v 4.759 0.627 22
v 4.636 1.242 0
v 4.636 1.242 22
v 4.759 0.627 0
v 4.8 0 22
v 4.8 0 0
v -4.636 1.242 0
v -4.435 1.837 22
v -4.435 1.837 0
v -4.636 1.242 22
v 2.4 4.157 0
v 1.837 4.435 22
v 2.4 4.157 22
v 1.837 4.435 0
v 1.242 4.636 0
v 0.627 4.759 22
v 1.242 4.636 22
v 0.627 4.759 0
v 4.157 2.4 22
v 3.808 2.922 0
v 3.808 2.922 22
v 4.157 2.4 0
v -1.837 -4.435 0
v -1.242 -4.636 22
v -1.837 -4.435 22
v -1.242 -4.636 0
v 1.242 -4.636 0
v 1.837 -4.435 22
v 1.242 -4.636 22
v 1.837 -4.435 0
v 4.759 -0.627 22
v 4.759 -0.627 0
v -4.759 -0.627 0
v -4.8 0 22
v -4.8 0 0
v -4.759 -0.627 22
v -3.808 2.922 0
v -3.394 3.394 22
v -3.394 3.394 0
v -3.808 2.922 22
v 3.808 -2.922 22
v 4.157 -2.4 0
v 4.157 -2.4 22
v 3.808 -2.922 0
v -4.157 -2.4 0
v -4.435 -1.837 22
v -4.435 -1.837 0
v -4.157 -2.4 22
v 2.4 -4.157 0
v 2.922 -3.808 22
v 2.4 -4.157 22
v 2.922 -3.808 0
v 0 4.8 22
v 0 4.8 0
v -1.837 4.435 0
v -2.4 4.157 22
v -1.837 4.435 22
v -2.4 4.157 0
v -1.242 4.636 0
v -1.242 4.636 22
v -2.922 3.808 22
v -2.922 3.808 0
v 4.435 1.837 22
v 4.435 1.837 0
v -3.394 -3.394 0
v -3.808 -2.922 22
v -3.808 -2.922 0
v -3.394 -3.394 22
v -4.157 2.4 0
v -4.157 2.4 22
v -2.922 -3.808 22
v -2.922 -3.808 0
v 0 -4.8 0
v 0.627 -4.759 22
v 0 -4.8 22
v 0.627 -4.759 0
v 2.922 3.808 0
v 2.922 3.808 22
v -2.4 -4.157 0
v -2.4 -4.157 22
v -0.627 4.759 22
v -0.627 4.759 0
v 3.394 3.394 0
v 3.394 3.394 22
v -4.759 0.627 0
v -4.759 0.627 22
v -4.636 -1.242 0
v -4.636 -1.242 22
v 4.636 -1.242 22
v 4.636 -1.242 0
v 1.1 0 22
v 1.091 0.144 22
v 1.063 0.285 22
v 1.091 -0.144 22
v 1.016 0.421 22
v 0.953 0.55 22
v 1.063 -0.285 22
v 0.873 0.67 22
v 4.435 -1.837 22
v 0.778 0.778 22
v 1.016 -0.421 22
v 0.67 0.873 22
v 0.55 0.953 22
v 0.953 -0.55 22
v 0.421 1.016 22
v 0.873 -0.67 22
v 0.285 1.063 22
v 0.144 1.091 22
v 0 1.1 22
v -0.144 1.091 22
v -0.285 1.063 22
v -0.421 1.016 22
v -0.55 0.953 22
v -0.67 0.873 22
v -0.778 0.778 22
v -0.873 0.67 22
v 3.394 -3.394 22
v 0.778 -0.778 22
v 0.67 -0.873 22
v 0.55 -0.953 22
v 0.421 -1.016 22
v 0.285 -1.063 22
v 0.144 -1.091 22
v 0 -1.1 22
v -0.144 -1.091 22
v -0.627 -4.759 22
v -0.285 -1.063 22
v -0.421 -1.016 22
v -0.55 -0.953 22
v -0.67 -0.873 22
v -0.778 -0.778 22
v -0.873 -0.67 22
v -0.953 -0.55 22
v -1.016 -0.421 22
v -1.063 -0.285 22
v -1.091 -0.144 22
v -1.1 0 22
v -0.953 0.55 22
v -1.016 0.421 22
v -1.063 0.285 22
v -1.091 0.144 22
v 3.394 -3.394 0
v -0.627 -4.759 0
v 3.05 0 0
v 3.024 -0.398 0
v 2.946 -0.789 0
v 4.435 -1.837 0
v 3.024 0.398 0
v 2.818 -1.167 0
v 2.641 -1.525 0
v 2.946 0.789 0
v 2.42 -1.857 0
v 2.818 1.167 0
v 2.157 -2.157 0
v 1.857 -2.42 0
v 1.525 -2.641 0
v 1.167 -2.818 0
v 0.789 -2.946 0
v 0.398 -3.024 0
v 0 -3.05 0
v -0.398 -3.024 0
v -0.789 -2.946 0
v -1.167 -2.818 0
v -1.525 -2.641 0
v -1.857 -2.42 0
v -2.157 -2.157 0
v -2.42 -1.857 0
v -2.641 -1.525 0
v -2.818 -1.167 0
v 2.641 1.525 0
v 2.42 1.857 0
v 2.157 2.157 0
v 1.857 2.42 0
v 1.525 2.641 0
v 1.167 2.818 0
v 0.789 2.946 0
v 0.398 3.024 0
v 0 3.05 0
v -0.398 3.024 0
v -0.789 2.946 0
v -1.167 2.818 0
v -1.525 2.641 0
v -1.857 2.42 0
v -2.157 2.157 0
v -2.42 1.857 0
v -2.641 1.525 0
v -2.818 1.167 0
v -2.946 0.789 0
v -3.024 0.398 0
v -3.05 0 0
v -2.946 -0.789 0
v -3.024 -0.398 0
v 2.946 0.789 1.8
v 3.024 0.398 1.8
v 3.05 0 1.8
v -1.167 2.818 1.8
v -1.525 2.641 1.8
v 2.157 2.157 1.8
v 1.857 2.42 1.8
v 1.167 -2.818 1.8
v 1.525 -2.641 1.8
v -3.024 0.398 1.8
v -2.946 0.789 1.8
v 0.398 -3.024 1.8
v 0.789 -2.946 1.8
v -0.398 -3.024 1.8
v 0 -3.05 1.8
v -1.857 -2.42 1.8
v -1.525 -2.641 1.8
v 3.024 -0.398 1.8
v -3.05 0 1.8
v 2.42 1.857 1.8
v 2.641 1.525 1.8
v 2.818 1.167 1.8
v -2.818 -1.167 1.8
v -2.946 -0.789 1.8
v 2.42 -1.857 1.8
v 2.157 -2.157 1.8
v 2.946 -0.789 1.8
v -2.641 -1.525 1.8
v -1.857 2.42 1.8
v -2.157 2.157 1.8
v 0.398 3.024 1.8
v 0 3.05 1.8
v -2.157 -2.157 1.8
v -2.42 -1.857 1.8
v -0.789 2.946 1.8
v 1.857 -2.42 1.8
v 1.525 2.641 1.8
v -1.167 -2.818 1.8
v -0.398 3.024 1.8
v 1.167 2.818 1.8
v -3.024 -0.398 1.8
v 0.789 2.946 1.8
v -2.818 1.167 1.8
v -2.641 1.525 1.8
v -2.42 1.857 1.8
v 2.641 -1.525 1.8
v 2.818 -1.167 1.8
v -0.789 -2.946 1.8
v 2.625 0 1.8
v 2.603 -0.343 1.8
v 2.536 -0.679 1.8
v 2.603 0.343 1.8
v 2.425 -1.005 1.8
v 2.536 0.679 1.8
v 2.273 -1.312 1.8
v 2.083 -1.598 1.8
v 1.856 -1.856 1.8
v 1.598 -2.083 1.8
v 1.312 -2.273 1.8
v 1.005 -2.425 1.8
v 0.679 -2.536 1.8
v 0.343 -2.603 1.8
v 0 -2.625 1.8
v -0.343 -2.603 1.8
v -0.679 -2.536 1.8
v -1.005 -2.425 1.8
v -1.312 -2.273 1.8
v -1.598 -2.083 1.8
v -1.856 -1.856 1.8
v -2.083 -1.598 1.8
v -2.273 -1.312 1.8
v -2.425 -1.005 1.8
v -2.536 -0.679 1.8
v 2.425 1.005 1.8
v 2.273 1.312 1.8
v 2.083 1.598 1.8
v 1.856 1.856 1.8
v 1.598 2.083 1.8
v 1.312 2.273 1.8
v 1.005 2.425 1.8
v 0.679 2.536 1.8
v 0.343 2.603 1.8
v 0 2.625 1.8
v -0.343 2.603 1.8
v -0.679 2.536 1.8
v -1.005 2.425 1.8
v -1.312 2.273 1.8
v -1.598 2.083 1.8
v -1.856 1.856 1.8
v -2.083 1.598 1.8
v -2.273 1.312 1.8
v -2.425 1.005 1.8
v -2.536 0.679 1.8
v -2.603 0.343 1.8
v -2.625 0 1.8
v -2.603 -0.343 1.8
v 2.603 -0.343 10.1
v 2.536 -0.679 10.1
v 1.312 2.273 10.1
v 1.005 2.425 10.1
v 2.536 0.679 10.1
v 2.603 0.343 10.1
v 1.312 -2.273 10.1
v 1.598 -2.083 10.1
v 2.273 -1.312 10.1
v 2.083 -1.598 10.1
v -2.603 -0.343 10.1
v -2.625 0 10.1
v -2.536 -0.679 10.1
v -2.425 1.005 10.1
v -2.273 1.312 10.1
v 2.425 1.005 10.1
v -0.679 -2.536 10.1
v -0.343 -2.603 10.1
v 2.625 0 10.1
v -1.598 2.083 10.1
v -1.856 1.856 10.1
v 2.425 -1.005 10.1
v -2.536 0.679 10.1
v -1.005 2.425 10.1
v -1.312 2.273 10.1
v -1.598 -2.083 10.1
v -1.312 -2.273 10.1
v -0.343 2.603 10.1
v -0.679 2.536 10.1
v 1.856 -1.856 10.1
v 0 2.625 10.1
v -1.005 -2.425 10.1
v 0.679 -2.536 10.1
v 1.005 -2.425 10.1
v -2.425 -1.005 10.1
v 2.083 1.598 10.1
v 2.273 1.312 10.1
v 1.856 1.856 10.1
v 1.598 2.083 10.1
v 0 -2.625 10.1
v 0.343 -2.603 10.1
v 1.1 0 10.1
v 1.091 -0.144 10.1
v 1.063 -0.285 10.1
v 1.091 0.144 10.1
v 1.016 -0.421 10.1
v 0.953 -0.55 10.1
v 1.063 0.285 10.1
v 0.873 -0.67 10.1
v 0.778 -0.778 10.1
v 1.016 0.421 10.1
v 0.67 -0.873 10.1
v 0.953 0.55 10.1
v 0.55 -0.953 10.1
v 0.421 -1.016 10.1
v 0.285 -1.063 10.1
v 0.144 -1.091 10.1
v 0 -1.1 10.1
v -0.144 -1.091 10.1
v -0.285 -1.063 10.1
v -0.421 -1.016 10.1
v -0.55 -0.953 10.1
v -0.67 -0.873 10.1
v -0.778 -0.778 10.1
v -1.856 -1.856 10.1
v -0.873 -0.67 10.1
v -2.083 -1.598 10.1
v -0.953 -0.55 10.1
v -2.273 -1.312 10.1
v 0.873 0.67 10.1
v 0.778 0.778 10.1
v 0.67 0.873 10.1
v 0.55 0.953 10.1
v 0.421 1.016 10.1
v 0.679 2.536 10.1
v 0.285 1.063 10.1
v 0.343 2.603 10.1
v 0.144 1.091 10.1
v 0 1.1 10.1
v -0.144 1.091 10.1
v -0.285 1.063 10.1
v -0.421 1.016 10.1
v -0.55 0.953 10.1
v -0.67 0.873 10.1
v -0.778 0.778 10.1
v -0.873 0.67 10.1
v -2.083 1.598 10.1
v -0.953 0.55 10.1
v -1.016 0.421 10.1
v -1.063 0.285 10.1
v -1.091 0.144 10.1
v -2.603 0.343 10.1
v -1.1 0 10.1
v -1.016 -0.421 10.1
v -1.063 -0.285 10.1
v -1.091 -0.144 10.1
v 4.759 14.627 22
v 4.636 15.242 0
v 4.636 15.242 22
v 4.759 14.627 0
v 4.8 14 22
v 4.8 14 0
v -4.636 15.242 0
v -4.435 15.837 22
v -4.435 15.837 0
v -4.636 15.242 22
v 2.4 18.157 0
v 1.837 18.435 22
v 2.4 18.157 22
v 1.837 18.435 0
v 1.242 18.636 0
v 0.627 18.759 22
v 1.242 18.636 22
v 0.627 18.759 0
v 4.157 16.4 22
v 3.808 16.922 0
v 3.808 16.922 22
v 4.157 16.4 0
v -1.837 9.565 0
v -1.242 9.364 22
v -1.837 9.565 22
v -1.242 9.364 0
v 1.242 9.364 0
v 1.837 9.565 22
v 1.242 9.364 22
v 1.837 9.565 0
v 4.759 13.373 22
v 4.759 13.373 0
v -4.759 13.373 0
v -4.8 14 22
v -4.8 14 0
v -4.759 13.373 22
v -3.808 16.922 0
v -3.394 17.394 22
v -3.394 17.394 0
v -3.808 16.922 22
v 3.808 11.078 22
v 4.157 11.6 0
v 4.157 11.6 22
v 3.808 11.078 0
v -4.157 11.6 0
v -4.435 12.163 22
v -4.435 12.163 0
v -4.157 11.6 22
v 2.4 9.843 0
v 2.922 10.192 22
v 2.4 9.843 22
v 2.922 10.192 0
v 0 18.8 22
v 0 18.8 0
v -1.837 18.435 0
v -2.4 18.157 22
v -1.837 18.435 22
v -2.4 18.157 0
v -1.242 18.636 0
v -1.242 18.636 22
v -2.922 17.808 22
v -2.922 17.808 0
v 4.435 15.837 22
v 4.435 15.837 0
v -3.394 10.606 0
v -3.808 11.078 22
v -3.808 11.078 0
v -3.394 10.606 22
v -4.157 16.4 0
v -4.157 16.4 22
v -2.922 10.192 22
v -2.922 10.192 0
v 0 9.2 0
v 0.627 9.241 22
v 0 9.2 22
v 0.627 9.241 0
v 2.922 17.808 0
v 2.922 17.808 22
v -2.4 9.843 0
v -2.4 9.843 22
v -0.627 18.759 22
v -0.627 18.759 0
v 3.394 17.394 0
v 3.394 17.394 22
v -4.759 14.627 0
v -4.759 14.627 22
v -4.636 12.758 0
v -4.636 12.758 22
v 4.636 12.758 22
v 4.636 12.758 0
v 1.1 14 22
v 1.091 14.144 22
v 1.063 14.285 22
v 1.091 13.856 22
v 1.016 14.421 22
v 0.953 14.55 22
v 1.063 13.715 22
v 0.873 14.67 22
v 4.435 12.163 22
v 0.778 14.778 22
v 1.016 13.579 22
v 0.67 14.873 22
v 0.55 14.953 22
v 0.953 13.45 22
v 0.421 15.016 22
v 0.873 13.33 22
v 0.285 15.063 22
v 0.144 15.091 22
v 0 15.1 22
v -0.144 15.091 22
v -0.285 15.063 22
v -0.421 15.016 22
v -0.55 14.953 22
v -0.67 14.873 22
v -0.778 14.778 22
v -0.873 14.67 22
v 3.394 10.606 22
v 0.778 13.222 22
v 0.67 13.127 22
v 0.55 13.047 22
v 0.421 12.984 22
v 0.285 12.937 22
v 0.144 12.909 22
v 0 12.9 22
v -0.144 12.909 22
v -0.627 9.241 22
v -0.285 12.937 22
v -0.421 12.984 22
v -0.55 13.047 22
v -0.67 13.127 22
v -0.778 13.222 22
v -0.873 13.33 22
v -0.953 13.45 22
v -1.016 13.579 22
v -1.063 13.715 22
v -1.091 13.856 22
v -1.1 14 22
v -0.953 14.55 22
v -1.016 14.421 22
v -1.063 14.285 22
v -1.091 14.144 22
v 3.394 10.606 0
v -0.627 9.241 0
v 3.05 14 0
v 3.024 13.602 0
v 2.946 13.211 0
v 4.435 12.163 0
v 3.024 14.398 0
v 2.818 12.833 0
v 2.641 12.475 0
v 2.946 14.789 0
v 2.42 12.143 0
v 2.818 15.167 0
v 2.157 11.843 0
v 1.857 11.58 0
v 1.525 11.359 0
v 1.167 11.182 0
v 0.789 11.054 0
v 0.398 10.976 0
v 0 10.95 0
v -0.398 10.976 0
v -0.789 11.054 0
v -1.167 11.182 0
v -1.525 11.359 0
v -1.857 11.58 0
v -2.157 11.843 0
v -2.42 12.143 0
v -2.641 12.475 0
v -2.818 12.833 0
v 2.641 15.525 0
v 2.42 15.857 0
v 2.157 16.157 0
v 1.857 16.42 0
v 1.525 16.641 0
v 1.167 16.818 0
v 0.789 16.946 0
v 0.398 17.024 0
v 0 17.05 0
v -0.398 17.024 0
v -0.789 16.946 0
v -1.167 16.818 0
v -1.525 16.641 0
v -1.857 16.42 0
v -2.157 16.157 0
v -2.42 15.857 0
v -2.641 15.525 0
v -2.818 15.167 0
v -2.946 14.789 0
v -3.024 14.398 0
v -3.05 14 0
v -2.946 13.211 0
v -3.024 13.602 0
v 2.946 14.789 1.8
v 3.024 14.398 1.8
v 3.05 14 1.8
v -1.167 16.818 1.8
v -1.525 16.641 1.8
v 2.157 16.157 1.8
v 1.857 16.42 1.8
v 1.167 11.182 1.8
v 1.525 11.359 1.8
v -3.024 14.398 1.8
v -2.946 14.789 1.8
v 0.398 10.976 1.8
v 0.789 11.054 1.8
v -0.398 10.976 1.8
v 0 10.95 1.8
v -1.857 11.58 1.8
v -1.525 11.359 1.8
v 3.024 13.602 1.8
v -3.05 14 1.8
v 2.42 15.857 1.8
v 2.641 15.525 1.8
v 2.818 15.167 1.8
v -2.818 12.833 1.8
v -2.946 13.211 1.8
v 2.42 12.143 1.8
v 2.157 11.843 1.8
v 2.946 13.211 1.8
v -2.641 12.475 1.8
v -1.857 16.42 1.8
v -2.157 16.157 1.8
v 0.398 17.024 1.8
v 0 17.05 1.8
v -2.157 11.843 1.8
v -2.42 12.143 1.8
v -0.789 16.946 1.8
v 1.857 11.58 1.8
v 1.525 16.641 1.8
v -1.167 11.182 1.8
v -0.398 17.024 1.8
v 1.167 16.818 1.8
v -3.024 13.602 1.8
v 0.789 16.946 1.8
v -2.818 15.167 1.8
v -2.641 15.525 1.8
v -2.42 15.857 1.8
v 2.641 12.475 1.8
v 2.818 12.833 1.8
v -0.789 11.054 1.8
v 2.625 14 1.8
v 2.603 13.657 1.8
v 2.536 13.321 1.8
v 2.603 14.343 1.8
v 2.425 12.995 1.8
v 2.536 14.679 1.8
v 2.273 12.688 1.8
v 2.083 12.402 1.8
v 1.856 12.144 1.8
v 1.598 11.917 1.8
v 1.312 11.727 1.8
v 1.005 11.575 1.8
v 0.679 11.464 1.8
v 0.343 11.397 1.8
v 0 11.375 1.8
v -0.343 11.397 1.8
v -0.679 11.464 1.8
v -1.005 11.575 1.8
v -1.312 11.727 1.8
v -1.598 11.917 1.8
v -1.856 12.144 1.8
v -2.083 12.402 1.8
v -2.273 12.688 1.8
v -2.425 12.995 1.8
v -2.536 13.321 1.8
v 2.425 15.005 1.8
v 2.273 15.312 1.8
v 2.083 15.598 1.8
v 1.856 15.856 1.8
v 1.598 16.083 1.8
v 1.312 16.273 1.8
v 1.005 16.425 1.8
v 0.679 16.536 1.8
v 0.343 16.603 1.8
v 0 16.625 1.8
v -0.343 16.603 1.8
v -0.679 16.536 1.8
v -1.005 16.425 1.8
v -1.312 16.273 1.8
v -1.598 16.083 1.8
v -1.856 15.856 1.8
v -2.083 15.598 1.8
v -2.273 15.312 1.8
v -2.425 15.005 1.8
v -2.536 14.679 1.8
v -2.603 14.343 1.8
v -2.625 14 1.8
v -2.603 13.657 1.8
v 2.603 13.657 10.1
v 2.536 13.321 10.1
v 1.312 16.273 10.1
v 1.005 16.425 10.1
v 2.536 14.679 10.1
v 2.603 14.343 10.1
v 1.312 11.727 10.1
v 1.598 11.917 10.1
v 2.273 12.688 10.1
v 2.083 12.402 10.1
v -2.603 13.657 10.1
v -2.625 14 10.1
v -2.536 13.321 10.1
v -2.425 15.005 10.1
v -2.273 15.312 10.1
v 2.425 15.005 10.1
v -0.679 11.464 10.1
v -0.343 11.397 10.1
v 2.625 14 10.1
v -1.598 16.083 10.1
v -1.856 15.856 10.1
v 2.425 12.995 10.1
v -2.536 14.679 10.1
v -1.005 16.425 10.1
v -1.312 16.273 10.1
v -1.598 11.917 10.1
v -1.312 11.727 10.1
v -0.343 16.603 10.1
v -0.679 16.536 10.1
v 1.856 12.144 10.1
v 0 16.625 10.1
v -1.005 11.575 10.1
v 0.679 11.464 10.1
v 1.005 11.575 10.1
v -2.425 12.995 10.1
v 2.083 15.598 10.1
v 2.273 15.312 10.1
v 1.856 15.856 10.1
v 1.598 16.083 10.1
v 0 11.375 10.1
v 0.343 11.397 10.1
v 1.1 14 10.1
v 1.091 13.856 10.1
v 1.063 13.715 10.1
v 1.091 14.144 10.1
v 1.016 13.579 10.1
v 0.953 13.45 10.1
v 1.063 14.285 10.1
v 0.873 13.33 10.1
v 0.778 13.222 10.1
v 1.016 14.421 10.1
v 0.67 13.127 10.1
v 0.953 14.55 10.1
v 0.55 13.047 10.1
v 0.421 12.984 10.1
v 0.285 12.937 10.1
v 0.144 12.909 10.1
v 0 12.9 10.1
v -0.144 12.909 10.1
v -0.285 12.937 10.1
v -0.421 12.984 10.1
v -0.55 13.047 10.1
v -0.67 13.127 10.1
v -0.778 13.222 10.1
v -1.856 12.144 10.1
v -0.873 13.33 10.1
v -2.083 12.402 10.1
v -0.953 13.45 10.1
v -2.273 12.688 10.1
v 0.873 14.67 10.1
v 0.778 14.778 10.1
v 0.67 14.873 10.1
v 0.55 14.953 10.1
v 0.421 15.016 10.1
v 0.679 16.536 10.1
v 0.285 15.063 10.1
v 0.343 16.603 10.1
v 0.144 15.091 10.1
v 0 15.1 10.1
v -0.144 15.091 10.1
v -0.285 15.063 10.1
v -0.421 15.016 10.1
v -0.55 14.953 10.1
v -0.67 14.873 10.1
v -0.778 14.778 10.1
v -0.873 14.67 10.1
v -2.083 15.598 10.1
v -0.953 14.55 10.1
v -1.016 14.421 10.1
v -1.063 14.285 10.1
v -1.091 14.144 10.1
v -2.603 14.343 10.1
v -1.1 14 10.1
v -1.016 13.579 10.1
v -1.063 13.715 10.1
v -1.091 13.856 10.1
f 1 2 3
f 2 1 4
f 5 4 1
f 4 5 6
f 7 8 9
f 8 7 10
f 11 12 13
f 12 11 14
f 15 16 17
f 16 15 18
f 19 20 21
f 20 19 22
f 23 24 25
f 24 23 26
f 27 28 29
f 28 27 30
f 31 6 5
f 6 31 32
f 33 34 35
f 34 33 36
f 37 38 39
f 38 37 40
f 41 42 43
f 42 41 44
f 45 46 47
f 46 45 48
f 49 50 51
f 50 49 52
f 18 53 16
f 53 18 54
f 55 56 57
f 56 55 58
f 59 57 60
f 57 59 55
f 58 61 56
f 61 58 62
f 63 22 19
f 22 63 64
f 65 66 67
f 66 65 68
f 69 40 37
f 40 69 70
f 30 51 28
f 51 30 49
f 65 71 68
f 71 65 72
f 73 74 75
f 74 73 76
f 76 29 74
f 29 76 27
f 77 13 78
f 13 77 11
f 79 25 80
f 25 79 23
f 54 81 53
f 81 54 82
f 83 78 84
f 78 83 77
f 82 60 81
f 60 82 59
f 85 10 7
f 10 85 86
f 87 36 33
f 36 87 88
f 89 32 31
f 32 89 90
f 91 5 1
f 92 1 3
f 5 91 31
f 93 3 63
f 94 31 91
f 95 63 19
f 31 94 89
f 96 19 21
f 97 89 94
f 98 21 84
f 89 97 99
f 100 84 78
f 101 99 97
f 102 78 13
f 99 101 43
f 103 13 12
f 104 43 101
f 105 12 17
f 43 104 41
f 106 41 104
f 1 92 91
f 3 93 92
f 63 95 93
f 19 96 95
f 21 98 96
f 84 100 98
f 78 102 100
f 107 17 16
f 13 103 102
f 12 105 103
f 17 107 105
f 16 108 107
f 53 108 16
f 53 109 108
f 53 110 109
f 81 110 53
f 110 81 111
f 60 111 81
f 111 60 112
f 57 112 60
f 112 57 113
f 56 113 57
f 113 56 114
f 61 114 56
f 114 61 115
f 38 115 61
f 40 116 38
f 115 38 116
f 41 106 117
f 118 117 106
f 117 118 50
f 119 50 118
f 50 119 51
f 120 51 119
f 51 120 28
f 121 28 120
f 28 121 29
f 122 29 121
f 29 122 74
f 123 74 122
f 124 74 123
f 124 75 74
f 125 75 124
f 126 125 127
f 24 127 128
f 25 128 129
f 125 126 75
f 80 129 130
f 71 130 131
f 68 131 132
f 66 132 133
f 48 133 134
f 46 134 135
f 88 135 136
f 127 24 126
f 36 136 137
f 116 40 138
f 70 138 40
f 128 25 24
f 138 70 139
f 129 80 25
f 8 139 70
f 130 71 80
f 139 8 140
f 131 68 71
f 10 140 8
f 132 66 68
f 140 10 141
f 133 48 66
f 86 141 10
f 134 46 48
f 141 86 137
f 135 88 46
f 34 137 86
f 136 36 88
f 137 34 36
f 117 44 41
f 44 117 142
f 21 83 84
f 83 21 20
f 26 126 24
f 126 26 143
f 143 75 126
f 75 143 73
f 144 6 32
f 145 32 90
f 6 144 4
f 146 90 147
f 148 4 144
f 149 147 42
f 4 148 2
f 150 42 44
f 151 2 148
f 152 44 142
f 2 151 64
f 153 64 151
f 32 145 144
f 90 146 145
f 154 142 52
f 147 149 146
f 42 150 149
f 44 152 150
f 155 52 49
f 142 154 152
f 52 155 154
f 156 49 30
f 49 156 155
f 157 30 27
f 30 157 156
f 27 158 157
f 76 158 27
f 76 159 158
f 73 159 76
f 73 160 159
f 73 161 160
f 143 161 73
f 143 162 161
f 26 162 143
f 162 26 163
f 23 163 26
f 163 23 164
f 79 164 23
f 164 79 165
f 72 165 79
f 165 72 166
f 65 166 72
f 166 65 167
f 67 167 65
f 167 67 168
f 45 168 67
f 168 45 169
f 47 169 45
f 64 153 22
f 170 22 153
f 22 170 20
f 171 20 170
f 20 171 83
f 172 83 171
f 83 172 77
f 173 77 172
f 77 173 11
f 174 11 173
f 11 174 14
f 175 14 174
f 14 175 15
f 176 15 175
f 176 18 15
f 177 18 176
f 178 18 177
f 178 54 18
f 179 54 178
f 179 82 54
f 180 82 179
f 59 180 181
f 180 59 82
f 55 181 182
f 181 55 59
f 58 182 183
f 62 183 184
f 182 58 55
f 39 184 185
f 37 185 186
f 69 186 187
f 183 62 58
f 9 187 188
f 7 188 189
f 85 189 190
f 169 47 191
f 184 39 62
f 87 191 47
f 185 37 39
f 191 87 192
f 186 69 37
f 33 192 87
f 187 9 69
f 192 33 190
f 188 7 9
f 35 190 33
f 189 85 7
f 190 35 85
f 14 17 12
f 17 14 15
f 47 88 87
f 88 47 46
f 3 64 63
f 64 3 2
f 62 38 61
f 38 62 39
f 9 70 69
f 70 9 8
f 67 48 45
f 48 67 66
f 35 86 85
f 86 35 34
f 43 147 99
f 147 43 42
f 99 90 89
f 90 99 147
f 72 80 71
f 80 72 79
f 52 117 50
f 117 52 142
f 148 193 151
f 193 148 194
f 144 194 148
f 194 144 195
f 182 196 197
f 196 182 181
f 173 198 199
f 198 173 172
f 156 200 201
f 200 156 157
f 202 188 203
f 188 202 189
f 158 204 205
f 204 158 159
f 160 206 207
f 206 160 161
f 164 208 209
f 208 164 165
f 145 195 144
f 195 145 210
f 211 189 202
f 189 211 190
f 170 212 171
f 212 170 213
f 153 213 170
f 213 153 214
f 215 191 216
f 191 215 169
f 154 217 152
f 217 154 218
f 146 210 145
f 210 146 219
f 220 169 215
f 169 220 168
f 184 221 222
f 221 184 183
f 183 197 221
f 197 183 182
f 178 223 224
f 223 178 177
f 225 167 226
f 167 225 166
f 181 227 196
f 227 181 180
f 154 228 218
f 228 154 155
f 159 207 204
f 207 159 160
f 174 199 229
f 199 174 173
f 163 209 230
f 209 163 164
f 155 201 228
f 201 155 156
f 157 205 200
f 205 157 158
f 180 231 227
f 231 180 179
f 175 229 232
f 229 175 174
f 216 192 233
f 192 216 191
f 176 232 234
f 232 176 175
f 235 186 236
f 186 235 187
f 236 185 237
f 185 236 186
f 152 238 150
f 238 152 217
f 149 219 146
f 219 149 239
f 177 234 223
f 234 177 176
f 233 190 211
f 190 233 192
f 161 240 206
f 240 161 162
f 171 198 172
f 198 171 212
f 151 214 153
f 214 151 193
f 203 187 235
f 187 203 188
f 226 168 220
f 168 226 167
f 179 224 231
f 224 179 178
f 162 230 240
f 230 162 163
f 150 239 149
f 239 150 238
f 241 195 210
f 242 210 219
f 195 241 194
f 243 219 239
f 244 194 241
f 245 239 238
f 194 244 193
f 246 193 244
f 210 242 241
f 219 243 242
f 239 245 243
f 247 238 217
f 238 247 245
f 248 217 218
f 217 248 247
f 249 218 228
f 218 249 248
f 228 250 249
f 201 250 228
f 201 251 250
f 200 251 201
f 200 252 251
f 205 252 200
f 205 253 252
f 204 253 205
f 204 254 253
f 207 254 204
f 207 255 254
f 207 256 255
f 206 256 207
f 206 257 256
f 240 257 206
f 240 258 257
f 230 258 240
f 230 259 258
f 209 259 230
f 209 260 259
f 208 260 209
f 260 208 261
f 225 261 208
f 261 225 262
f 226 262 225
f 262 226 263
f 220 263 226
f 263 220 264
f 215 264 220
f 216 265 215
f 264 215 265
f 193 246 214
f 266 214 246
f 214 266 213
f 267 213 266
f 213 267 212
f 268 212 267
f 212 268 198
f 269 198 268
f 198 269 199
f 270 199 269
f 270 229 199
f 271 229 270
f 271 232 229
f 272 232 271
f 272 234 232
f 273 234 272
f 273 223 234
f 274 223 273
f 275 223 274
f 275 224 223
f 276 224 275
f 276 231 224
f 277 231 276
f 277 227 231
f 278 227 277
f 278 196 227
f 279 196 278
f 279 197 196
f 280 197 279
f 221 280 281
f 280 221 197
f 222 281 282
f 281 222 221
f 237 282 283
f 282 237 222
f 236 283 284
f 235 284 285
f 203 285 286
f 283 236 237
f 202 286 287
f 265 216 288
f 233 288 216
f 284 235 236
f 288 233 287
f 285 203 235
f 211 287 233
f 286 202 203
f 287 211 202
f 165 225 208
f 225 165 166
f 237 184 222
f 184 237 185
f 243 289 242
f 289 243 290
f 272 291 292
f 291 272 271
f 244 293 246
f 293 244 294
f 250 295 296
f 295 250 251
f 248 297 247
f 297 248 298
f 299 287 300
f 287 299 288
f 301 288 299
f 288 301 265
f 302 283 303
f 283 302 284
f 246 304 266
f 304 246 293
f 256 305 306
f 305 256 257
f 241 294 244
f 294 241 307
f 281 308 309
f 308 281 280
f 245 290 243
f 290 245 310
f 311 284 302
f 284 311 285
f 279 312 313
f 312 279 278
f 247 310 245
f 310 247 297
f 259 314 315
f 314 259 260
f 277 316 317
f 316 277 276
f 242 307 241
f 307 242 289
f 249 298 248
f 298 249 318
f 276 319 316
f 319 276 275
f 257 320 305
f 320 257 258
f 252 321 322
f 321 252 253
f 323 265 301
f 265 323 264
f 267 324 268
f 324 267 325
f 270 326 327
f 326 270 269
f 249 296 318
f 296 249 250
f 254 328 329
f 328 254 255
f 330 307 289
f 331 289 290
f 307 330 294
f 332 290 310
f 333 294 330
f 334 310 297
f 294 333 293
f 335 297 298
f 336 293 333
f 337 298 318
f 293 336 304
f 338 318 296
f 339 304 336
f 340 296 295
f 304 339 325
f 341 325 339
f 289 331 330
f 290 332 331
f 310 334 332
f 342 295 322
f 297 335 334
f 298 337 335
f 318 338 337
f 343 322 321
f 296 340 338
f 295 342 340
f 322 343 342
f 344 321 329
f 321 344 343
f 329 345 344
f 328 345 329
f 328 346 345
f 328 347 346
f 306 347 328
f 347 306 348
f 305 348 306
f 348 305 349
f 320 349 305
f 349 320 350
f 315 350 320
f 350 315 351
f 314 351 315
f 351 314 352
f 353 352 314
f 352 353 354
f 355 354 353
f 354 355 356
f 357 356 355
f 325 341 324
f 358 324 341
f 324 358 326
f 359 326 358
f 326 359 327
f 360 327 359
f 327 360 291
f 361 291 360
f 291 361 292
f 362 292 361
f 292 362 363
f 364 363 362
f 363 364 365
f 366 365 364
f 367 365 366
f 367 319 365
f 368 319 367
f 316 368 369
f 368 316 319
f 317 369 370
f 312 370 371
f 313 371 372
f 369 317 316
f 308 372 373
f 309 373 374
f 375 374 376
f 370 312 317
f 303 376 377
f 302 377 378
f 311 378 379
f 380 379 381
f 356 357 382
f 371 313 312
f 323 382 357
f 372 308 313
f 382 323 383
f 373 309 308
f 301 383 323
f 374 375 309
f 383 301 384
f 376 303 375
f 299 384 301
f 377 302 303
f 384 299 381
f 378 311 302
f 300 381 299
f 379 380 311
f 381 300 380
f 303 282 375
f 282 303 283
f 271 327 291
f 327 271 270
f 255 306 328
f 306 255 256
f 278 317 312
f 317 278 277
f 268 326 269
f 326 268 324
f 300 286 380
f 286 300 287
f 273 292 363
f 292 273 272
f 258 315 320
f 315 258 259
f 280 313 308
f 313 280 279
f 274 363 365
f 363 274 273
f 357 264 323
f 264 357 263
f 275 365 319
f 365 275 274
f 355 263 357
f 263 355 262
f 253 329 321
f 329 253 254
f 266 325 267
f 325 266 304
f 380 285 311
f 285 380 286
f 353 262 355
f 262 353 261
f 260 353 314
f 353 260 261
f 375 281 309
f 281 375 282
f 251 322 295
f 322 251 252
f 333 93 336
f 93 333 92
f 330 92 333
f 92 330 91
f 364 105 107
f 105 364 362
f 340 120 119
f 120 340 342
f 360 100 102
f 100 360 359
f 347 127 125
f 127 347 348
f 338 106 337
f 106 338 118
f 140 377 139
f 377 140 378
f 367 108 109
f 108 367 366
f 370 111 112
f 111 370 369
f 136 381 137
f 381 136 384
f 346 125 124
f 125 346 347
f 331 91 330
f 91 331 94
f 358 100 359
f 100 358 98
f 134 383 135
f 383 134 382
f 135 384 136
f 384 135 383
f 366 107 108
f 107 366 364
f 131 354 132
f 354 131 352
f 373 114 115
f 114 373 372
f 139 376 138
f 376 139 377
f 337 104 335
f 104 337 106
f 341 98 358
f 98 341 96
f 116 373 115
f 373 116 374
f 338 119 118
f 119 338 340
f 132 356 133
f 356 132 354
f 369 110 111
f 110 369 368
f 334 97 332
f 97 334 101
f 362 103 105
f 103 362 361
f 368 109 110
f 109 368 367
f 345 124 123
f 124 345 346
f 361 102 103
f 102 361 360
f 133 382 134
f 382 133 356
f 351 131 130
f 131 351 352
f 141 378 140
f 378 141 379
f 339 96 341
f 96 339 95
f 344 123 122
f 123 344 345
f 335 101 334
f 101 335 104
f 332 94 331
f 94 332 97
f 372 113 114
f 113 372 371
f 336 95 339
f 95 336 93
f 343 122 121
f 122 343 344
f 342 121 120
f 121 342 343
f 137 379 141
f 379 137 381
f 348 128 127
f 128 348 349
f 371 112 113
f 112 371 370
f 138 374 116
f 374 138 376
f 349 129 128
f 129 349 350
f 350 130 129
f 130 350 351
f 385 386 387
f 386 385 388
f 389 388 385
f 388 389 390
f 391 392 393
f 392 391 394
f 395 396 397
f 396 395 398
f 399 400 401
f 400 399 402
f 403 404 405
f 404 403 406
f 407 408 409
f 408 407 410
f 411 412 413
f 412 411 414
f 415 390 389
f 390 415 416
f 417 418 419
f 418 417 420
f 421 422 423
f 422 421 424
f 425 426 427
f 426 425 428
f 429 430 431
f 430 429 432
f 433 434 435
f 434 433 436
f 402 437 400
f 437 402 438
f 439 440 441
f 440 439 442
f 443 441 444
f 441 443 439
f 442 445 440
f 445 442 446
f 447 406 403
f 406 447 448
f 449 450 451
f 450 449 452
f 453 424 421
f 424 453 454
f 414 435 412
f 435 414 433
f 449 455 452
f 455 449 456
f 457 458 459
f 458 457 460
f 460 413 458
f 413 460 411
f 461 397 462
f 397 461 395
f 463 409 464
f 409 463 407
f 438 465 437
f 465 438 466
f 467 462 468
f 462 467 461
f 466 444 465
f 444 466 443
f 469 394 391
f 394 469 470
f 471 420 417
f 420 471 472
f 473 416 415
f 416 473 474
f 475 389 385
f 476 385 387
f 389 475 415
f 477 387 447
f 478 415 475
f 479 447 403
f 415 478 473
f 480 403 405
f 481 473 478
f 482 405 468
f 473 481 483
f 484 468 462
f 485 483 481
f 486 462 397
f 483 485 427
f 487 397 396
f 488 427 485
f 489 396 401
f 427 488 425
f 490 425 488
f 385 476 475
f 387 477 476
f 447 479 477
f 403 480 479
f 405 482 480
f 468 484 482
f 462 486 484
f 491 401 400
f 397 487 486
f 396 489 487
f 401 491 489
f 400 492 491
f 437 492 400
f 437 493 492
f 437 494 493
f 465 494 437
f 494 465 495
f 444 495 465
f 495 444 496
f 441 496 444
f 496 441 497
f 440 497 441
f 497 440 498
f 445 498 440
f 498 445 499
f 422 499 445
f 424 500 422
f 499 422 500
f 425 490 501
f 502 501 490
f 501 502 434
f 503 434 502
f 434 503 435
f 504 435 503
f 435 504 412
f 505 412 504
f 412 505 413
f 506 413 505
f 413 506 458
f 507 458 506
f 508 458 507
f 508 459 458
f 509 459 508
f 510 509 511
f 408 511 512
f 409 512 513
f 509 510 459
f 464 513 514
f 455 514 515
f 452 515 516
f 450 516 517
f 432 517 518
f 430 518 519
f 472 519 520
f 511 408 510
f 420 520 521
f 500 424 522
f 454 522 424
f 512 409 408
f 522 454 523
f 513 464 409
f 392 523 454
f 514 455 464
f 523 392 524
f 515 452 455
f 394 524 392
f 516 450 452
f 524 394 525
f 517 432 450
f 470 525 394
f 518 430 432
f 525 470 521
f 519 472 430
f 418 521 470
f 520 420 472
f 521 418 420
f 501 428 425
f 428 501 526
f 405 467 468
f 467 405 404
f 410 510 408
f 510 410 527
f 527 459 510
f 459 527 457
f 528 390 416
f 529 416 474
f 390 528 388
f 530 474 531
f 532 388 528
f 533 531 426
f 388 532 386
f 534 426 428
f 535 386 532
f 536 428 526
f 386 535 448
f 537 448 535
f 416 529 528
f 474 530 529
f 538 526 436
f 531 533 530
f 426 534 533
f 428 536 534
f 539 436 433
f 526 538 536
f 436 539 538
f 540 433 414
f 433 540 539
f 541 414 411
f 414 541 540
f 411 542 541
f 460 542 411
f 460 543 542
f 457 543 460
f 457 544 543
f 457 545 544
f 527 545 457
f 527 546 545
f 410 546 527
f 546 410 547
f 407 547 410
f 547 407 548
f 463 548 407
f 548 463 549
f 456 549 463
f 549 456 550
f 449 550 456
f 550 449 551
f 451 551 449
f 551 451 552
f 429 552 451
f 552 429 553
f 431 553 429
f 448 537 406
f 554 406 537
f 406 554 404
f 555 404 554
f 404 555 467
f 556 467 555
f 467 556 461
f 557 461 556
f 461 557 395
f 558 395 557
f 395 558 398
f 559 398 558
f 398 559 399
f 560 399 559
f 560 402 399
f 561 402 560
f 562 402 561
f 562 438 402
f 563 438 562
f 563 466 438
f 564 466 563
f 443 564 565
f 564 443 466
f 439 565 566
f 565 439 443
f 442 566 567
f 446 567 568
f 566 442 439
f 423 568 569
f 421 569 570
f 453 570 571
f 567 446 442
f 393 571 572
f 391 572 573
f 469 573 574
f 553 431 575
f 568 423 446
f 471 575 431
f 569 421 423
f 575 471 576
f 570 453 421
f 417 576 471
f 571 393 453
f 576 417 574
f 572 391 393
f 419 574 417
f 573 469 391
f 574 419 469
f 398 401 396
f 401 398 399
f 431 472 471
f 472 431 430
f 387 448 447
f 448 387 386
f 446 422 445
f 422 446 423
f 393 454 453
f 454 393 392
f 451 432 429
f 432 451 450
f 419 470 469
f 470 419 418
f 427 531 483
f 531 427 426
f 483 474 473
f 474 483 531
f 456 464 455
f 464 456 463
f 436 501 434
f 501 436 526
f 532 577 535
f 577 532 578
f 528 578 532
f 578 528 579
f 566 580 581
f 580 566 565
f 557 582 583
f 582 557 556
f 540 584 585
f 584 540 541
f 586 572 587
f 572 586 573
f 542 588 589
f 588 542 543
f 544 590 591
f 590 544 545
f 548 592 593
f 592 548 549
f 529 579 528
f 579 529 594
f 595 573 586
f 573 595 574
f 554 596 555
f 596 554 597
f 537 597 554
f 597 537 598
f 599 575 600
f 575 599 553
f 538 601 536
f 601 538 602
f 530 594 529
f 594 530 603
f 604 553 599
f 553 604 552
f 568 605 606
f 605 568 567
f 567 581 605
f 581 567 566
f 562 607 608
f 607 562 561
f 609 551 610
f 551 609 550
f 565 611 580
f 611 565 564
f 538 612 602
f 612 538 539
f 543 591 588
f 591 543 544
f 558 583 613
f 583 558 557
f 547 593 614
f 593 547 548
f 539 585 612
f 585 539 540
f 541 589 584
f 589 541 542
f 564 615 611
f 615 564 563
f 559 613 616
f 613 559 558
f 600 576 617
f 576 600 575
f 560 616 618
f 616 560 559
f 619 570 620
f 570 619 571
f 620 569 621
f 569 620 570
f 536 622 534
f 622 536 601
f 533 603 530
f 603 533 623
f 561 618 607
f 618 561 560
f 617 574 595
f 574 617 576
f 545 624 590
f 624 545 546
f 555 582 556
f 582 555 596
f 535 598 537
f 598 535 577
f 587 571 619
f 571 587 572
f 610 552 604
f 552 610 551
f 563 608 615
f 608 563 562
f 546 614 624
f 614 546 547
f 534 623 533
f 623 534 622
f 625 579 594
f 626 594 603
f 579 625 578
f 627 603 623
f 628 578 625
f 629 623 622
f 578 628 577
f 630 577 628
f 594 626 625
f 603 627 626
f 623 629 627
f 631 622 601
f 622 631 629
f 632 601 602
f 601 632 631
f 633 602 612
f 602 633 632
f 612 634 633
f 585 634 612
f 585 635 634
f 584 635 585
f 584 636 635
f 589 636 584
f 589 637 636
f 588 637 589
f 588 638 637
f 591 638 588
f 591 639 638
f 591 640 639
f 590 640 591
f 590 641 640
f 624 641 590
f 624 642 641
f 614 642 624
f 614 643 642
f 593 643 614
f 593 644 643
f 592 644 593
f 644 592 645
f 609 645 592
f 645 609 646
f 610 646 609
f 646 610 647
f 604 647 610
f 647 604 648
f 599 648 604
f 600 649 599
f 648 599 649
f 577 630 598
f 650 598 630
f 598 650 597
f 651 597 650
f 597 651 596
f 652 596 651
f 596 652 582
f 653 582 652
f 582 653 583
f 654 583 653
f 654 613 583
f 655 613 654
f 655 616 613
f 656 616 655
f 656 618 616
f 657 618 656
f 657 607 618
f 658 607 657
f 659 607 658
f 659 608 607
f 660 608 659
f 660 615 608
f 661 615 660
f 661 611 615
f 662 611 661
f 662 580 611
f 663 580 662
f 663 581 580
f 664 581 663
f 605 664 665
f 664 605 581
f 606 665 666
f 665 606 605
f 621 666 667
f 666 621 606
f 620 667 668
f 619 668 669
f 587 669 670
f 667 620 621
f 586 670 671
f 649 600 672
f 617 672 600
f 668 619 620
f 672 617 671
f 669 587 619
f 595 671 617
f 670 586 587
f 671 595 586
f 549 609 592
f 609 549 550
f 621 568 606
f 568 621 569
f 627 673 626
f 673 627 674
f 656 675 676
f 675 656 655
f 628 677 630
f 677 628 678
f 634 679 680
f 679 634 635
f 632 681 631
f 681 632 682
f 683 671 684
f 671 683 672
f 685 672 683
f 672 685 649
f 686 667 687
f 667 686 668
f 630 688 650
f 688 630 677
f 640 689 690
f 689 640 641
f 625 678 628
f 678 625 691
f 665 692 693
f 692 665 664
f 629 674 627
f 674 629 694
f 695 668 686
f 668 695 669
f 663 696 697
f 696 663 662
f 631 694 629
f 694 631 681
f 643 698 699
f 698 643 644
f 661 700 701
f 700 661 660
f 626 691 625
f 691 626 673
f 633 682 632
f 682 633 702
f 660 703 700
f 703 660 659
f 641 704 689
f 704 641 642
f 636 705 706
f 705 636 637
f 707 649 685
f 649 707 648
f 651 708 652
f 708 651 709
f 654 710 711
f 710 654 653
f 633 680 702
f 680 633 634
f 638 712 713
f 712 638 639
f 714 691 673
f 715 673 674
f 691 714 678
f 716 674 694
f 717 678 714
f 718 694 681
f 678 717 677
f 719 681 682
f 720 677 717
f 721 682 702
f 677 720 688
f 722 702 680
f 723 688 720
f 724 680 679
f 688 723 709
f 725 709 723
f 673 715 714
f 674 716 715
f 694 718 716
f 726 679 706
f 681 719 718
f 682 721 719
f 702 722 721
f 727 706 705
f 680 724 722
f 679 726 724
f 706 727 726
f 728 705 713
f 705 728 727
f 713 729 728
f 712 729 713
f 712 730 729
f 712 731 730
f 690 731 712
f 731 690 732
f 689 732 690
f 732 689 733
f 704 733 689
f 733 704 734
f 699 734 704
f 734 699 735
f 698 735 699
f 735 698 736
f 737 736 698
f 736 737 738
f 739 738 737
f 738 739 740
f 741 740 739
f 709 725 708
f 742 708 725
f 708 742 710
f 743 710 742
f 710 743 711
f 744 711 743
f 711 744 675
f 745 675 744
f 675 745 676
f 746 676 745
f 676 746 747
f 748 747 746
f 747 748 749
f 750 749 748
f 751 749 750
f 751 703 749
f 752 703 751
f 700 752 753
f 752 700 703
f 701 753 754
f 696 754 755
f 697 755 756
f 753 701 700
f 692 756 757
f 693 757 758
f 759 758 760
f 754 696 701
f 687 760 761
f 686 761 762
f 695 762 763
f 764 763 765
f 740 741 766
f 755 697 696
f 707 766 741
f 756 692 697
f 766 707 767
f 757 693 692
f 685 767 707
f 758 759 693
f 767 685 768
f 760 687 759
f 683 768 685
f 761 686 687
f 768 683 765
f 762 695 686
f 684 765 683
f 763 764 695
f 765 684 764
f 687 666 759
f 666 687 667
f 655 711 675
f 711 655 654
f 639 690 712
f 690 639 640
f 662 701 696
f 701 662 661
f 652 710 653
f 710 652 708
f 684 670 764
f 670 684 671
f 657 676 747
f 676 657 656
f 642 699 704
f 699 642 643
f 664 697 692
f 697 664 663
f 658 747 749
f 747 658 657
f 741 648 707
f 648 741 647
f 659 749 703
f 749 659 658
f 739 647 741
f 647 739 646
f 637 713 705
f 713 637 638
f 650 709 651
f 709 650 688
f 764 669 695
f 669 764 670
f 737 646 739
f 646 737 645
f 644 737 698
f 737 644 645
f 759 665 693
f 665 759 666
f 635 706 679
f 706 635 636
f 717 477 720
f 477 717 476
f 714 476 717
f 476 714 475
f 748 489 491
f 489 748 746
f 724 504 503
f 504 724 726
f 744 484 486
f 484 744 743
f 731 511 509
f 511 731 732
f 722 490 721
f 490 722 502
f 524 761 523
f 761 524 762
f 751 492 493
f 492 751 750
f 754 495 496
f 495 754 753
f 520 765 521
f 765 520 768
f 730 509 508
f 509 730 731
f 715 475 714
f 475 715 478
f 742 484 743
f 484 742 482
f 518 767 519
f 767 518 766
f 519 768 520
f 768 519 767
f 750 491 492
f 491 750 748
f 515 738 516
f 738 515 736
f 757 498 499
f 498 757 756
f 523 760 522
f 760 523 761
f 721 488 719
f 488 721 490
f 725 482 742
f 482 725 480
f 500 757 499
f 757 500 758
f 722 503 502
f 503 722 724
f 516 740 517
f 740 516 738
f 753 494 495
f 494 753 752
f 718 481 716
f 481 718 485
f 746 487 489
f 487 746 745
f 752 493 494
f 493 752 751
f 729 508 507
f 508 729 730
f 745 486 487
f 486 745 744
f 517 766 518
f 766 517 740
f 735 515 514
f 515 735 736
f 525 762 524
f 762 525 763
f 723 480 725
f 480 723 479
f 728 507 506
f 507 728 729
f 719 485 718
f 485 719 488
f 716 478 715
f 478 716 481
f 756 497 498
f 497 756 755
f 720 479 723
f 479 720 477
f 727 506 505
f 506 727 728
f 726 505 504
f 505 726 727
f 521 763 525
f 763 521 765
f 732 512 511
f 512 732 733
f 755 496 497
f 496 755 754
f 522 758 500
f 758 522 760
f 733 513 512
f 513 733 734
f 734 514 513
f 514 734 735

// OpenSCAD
// Parámetros de Solicitud en LAIMI F4-05:
//   - Carné: 2022437519
//   - Uso: Curso (EL2113 - Circuitos Eléctricos en Corriente Continua)
//   - Material: PLA (o PETG)
//   - Resolución eje Z: 0.2 mm
//   - Relleno (Infill): 20% a 30%
//   - Color: Preferible negro u oscuro opaco (o pintar con acrílico negro).
// ============================================================================

$fn = 48;

d_ext_cap    = 9.6;  // Diámetro exterior compacto (< 4 filas de protoboard)
d_comp_cap   = 5.25; // Cavidad inferior para domo de LED 5 mm o LDR GL5528
d_reb_cap    = 6.1;  // Alojamiento inferior para el reborde del LED
d_fibra_cap  = 2.2;  // Conducto superior para fibra óptica plástica (POF)
h_total_cap  = 22.0; // Altura total del capuchón directo
h_comp_cap   = 10.0; // Profundidad de encaje sobre el LED/LDR

module capuchon_directo_protoboard() {
    difference() {
        // Cuerpo cilíndrico exterior sin pestañas laterales
        cylinder(h = h_total_cap, d = d_ext_cap, center = false);

        // Reborde inferior del LED (1.8 mm)
        translate([0, 0, -0.1])
            cylinder(h = 1.9, d = d_reb_cap, center = false);

        // Cavidad para el cuerpo del LED / LDR
        translate([0, 0, 1.7])
            cylinder(h = h_comp_cap - 1.6, d = d_comp_cap, center = false);

        // Conducto coaxial superior para la fibra óptica (12 mm de guía)
        translate([0, 0, h_comp_cap])
            cylinder(h = (h_total_cap - h_comp_cap) + 0.2, d = d_fibra_cap, center = false);
    }
}

// Instanciar par de capuchones (TX para LED y RX para LDR)
capuchon_directo_protoboard();
translate([0, 14, 0])
    capuchon_directo_protoboard();
